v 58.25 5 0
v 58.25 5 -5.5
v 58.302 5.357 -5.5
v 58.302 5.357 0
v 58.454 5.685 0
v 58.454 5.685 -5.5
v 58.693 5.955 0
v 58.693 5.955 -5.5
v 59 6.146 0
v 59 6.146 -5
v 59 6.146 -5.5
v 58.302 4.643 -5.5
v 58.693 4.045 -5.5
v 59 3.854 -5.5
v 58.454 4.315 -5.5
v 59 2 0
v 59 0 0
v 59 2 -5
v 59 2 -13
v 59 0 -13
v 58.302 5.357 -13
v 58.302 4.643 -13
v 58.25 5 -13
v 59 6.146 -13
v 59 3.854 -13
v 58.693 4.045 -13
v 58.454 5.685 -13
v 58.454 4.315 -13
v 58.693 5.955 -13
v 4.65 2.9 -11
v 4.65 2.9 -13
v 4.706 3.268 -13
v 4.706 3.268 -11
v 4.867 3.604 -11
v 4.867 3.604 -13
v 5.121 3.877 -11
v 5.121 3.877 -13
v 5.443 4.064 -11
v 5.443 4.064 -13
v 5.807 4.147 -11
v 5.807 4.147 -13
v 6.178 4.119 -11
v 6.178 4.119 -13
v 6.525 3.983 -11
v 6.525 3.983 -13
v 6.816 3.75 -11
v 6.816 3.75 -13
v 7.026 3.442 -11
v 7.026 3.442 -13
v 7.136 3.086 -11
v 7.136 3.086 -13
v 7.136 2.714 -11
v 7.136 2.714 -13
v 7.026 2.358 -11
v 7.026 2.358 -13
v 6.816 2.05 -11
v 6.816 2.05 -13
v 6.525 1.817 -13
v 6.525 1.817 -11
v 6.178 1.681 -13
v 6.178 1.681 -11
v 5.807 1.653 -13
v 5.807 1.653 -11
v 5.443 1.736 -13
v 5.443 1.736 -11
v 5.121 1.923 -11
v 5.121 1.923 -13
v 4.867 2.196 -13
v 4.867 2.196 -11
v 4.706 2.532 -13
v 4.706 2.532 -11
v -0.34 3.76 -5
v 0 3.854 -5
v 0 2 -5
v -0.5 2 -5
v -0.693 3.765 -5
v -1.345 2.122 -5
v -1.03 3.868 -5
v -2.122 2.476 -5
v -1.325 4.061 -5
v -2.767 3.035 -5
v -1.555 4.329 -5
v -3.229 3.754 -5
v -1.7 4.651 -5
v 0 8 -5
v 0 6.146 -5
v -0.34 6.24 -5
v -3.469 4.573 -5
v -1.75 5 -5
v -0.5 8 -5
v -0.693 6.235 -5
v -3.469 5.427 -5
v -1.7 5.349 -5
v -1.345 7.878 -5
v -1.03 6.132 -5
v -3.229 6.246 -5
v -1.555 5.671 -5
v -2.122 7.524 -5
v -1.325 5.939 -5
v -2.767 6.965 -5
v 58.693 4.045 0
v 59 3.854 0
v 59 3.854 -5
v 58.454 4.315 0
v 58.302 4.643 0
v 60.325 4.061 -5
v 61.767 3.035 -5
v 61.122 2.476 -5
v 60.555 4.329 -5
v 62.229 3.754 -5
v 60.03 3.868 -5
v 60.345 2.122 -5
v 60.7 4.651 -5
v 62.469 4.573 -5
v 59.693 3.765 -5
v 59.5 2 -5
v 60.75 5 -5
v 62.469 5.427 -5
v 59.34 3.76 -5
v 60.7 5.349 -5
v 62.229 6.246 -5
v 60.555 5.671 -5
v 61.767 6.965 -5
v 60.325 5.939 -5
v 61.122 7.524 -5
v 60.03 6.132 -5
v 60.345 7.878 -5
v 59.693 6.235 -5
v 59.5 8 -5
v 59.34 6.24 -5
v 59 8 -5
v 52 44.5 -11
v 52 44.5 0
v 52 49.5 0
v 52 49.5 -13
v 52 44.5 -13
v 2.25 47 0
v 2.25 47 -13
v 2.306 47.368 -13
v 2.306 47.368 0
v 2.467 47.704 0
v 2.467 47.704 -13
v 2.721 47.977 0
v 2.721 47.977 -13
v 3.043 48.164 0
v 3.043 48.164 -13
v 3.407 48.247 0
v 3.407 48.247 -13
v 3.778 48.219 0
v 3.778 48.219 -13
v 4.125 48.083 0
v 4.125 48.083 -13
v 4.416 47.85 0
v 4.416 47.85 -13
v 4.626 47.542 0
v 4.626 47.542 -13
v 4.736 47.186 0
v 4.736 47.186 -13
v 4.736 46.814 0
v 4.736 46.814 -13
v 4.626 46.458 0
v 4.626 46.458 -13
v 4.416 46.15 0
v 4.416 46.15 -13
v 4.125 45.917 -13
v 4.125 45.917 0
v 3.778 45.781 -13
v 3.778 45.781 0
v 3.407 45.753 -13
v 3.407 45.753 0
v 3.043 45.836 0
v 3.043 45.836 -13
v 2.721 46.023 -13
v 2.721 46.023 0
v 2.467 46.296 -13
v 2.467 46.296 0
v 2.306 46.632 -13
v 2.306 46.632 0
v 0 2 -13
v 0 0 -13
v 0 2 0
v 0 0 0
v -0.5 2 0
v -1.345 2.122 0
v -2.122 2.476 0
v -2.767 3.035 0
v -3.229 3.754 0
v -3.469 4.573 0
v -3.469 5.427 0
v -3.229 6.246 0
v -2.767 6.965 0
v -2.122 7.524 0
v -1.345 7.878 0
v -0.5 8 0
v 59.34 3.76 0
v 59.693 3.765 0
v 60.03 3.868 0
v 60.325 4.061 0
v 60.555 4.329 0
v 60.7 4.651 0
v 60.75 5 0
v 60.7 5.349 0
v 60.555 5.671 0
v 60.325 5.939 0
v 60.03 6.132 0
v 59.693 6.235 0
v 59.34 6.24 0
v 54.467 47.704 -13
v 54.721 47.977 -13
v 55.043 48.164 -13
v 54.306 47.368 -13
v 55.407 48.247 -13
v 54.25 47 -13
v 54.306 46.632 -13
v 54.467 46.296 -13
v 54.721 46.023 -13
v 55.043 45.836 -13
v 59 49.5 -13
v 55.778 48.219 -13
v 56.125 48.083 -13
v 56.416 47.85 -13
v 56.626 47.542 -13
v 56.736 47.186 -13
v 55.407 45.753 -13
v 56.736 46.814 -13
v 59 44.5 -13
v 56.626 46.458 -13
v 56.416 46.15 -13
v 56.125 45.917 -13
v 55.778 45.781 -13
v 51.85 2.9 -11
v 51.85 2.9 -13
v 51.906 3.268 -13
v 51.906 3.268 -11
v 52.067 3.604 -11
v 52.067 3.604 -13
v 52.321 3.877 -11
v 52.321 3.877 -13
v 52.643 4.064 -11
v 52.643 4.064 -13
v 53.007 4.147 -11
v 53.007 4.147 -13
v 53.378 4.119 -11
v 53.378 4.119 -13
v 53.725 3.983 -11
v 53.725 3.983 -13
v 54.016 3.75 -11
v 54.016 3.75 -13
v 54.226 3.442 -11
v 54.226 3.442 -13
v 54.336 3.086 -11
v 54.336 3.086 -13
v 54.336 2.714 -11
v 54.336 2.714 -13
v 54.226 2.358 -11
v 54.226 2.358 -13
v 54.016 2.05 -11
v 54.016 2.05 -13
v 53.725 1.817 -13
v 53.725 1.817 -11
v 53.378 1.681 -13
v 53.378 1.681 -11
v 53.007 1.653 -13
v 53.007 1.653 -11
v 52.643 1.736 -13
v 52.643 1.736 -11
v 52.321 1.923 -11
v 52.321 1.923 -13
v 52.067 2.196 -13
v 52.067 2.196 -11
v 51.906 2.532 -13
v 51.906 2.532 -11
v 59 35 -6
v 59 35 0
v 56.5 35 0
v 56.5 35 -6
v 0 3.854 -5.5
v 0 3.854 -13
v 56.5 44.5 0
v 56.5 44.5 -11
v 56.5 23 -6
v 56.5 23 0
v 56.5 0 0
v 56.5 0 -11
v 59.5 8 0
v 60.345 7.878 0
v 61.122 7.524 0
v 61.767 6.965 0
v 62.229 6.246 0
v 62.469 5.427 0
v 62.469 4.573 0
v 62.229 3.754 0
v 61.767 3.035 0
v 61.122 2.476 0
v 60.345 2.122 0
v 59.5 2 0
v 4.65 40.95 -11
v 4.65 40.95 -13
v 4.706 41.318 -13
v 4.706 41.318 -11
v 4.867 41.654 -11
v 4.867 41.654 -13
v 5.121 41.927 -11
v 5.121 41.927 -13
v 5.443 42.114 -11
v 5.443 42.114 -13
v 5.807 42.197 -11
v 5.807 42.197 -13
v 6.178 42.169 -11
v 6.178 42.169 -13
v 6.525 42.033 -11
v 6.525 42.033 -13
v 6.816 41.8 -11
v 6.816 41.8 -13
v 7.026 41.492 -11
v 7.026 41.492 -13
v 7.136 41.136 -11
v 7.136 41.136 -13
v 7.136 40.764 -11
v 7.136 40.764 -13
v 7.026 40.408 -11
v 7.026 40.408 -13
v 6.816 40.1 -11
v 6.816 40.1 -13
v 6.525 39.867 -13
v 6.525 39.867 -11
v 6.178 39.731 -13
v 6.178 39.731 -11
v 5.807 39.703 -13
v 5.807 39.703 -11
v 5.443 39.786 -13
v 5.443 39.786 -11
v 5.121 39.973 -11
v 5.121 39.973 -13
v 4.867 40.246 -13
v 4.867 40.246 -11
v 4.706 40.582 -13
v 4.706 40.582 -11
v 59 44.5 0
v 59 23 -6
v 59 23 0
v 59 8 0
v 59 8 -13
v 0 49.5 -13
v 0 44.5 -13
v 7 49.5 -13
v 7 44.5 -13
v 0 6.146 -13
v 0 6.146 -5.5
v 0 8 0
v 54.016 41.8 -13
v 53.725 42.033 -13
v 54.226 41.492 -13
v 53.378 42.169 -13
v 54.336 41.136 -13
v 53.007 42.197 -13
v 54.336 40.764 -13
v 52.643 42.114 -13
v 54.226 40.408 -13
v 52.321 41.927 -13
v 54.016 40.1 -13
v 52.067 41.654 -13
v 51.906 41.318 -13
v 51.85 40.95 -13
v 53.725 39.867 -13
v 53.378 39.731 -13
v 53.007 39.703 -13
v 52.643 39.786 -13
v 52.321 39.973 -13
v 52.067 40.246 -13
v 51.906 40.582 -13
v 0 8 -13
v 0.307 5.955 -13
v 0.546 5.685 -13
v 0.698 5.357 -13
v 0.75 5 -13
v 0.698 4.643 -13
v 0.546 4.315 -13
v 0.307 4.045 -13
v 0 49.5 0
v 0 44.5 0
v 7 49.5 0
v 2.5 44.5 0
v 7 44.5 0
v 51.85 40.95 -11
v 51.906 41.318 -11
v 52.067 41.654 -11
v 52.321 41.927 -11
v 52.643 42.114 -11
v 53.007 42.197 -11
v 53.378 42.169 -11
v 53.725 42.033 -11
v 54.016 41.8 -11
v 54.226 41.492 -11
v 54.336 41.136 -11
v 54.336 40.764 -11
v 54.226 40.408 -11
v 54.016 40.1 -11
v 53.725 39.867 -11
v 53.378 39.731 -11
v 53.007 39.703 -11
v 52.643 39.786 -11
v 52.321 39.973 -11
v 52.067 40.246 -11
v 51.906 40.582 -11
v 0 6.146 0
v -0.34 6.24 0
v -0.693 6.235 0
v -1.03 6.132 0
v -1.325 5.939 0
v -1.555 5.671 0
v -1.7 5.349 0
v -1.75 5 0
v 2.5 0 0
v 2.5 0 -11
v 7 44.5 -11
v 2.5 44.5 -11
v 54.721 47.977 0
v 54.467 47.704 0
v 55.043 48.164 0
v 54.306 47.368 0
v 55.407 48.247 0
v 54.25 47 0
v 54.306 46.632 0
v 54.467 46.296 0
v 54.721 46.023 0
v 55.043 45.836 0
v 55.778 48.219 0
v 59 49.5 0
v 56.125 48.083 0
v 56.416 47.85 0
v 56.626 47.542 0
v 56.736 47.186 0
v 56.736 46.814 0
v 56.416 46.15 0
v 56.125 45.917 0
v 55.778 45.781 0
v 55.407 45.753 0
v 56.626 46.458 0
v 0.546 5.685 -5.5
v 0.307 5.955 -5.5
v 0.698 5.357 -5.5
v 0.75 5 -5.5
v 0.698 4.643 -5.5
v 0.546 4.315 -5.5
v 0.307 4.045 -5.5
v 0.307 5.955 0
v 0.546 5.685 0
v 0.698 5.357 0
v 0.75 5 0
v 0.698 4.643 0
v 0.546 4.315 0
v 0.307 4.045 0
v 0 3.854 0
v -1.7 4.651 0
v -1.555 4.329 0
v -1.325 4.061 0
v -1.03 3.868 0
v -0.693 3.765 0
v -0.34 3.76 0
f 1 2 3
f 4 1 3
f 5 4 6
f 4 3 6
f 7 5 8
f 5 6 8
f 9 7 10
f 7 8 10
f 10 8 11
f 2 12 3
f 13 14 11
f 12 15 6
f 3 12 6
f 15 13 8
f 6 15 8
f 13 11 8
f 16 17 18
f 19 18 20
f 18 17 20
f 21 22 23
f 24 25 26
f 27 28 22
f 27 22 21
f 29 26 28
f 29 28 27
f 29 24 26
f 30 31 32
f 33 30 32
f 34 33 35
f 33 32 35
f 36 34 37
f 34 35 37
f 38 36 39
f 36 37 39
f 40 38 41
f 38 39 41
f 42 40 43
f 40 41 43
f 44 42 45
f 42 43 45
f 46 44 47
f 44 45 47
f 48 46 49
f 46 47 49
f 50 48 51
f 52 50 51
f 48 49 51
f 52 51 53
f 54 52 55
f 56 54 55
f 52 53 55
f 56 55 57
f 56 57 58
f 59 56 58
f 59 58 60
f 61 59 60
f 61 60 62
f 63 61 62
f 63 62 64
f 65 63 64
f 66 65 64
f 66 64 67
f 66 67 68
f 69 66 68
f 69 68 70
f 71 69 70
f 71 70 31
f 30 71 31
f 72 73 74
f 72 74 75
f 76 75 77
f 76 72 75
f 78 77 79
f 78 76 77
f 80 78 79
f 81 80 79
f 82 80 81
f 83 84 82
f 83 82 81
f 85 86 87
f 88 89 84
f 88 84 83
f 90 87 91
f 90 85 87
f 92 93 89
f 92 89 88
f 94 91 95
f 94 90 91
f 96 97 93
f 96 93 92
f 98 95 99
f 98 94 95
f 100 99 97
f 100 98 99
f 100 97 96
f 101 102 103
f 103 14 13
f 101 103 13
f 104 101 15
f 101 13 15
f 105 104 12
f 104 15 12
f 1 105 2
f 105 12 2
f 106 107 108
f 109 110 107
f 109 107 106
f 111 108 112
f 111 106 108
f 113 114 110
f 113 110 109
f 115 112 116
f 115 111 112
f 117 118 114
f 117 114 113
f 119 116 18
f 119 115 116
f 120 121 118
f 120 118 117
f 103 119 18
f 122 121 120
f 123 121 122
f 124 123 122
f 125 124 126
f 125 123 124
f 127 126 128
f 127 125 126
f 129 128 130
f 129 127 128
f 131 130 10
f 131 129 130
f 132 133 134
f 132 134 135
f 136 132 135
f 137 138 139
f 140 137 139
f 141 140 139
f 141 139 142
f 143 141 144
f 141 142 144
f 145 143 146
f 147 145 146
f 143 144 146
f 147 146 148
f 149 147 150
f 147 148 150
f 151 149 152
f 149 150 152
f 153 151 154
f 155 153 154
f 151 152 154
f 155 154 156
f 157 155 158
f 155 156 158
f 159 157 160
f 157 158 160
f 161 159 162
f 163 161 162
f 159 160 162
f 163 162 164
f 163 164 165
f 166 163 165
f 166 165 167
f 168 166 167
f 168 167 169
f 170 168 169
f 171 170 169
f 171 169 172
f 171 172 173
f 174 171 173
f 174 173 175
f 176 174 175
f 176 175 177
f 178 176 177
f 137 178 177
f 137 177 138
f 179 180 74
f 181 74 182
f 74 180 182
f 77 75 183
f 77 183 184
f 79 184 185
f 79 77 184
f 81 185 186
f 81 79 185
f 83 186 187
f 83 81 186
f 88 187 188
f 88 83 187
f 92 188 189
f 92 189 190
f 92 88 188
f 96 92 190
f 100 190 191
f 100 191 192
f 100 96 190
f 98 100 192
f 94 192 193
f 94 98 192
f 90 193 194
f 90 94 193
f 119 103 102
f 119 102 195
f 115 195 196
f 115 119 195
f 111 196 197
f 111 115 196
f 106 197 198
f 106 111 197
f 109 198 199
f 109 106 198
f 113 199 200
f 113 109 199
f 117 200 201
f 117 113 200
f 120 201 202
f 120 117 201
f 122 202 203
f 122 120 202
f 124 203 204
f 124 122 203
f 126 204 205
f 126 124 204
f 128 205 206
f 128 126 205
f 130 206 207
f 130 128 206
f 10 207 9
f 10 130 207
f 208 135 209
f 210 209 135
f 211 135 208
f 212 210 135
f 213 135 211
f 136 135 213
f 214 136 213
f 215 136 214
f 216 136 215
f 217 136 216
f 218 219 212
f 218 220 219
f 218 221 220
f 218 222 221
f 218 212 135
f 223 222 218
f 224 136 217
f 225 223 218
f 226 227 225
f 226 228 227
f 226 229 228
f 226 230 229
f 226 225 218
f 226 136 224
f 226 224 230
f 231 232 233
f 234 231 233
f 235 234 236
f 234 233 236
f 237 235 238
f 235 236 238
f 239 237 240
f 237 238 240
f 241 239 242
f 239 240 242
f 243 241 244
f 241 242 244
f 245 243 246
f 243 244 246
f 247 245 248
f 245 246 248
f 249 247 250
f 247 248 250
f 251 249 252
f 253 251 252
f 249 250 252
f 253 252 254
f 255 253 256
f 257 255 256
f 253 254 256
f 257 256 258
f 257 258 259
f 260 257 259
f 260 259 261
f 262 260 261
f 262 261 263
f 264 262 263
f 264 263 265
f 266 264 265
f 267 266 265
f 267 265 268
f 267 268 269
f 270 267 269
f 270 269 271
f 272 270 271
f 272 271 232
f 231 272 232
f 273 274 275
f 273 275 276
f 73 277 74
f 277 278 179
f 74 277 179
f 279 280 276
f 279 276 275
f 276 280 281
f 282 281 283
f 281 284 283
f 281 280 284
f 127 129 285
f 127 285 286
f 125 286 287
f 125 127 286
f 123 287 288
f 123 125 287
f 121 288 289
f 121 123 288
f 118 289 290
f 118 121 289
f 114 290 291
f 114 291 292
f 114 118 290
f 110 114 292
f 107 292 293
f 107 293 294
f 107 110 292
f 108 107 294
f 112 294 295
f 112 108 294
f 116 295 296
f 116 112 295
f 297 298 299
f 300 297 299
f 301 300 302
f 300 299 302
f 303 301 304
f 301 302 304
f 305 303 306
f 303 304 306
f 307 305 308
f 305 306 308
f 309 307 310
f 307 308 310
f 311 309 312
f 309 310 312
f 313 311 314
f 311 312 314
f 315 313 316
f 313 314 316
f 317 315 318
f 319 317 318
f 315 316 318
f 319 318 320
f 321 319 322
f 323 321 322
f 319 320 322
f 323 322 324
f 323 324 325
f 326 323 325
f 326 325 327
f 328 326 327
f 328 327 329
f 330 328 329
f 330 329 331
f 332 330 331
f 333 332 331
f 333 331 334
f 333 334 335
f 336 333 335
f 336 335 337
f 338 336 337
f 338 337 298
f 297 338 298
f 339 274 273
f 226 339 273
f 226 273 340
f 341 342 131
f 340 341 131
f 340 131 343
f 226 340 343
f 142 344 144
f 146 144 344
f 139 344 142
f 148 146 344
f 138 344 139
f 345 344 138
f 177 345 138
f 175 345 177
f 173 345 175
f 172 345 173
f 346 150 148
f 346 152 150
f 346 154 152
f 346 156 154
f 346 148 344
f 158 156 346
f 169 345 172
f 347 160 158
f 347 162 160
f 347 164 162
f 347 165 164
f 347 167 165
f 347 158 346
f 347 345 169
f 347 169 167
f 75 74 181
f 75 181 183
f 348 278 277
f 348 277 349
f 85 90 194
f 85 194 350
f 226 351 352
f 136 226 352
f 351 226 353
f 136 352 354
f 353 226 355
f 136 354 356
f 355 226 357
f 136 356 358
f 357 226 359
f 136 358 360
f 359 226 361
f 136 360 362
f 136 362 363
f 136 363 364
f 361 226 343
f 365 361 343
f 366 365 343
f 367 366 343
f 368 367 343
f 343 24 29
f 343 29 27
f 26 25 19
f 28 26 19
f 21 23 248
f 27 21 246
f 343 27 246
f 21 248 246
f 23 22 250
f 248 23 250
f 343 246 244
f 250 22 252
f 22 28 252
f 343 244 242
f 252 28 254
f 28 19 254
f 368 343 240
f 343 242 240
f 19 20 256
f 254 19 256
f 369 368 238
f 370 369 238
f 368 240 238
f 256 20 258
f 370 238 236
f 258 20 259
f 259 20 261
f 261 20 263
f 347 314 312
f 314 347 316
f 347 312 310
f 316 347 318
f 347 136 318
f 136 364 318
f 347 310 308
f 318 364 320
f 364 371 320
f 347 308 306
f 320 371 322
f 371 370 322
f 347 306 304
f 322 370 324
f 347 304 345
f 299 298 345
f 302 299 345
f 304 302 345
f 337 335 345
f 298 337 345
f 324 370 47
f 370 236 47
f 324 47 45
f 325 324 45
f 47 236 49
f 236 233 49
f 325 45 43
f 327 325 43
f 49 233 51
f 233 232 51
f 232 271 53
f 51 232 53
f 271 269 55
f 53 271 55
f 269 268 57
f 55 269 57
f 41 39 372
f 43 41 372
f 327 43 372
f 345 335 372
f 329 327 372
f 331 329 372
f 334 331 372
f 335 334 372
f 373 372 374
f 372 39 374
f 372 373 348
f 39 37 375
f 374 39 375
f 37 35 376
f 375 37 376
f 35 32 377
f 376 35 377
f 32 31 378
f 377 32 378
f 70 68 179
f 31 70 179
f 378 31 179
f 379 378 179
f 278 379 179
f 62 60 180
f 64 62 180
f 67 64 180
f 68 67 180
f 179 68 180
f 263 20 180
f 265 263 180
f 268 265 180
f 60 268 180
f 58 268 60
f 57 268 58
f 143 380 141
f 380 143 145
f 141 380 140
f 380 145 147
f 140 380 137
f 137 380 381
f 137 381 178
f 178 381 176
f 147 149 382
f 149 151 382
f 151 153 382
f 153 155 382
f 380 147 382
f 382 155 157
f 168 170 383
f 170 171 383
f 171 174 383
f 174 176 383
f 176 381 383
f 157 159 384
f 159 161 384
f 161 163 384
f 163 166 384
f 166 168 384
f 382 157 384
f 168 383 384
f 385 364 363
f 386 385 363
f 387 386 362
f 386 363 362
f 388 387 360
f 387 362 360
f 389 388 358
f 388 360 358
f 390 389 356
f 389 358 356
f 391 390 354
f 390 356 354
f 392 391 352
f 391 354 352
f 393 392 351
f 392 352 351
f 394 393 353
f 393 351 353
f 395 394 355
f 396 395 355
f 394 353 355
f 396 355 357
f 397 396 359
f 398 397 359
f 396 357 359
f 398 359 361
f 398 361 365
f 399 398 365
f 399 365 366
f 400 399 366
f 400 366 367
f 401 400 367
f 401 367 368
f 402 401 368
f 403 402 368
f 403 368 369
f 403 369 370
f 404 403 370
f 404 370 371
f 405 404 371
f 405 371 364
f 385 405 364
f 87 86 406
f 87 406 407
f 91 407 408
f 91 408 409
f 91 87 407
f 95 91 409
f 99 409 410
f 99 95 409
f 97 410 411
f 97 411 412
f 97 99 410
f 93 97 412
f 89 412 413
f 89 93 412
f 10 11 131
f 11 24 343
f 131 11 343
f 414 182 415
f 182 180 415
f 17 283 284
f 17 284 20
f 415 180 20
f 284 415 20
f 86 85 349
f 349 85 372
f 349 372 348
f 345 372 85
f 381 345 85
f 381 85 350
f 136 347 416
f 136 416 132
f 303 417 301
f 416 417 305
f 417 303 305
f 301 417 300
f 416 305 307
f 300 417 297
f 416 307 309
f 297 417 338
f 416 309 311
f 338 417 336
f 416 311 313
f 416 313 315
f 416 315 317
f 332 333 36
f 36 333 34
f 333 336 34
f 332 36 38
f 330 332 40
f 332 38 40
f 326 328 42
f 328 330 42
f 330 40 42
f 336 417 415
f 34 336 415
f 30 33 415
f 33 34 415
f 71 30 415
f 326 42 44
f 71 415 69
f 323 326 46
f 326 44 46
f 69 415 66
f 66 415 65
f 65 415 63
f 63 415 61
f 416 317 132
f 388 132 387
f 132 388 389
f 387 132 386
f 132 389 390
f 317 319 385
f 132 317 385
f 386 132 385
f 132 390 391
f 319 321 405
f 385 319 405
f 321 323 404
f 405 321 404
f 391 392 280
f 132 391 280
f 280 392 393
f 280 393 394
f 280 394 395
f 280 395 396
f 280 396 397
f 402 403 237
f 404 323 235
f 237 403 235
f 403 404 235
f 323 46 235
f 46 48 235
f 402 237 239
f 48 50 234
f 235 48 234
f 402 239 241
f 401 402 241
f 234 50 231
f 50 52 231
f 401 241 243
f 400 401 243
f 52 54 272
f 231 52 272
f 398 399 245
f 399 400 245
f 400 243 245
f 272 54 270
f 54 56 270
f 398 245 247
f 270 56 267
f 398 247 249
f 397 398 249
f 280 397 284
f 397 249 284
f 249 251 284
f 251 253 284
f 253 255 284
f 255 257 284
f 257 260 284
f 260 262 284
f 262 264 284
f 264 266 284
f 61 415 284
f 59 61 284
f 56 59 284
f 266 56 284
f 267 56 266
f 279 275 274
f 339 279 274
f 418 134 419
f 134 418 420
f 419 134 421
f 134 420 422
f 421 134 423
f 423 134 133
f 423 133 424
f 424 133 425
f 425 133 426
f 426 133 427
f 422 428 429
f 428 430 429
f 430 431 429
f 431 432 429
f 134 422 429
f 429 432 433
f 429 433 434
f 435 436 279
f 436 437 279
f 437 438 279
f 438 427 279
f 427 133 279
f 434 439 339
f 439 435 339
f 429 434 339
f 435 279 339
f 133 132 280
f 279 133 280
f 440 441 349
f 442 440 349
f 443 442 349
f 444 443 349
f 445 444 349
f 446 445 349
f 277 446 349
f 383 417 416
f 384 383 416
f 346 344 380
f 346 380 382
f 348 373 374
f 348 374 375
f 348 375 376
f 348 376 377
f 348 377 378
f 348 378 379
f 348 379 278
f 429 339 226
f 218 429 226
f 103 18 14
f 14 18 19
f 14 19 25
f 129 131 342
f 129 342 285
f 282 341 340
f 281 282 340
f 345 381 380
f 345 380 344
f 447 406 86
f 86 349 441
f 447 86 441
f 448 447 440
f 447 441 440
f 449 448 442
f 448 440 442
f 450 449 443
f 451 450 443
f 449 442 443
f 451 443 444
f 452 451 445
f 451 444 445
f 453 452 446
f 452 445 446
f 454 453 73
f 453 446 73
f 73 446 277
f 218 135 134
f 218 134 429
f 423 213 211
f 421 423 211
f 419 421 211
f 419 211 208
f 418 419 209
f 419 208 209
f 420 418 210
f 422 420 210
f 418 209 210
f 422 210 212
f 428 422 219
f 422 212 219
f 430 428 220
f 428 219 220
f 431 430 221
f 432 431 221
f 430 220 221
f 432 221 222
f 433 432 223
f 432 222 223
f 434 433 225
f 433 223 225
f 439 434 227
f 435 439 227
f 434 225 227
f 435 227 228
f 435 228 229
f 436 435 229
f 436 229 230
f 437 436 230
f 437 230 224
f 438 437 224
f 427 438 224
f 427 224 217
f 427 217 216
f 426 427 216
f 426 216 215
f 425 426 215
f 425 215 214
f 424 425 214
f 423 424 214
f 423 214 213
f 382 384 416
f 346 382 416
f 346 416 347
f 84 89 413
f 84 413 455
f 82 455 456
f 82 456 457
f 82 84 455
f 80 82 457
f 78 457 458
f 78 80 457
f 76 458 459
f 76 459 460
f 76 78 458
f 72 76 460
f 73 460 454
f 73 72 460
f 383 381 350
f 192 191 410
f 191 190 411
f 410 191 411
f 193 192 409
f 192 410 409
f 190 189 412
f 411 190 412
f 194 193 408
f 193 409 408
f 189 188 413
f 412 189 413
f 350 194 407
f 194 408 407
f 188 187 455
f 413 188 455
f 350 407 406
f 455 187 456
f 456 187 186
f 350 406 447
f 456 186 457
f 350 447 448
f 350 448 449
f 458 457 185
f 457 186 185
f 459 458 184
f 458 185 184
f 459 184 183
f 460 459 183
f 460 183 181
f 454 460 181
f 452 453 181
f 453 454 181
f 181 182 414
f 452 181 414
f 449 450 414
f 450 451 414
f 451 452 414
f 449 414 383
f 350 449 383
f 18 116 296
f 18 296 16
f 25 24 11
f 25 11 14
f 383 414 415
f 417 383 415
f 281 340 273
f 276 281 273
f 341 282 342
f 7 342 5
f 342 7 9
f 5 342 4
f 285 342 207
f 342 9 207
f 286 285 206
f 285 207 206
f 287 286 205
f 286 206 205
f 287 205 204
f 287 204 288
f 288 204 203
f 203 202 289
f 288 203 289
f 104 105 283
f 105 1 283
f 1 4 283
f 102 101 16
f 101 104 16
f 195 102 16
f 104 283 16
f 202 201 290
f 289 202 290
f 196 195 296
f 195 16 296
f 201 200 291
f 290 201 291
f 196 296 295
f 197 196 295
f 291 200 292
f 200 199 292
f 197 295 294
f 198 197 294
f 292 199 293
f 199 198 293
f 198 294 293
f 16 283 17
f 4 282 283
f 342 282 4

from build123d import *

# Parameters (mm, degrees)
BOSS_EXTRUDE1_DEPTH = 44.5
SKETCH2_W           = 6
SKETCH2_H           = 12
CUT_EXTRUDE1_DEPTH  = 10
BOSS_EXTRUDE2_DEPTH = 13
CUT_EXTRUDE2_DEPTH  = 13
SKETCH4_W           = 7
SKETCH4_H           = 13
BOSS_EXTRUDE3_DEPTH = 5
SKETCH5_R           = 1.25
CUT_EXTRUDE3_DEPTH  = 81.78056697
SKETCH7_R           = 1.25
CUT_EXTRUDE4_DEPTH  = 10
CUT_EXTRUDE6_DEPTH  = 8
BOSS_EXTRUDE4_DEPTH = 7.5


with BuildPart() as part:
    # Sketch1 → Boss-Extrude1 (new body)
    with BuildSketch(Plane(origin=(0, 0, 0), x_dir=(1, 0, 0), z_dir=(0, 1, 0))):
        Polygon((0, 0), (2.5, 0), (2.5, 11), (56.5, 11), (56.5, 0), (59, 0), (59, 13), (0, 13), align=None)
    extrude(amount=BOSS_EXTRUDE1_DEPTH)

    # Sketch2 → Cut-Extrude1 (cut)
    with BuildSketch(Plane(origin=(59, 0, 0), x_dir=(0, 0, -1), z_dir=(1, 0, 0))):
        with Locations((3, 29)):
            Rectangle(SKETCH2_W, SKETCH2_H)
    extrude(amount=-CUT_EXTRUDE1_DEPTH, mode=Mode.SUBTRACT)

    # Sketch3 → Boss-Extrude2 (add)
    with BuildSketch(Plane(origin=(0, 0, -13), x_dir=(-1, 0, 0), z_dir=(0, 0, -1))):
        with BuildLine():
            Line((-59, 6.145643924), (-59, 8))
            Line((-59, 8), (-59.5, 8))
            ThreePointArc((-59.5, 8), (-62.5, 5), (-59.5, 2))
            Line((-59.5, 2), (-59, 2))
            Line((-59, 2), (-59, 3.854356076))
            ThreePointArc((-59, 3.854356076), (-60.75, 5), (-59, 6.145643924))
        make_face()
        with BuildLine():
            Line((0.5, 8), (0, 8))
            Line((0, 8), (0, 6.145643924))
            ThreePointArc((0, 6.145643924), (1.75, 5), (0, 3.854356076))
            Line((0, 3.854356076), (0, 2))
            Line((0, 2), (0.5, 2))
            ThreePointArc((0.5, 2), (3.5, 5), (0.5, 8))
        make_face()
    extrude(amount=-BOSS_EXTRUDE2_DEPTH)

    # Sketch3<3> → Cut-Extrude2 (cut)
    with BuildSketch(Plane(origin=(0, 0, -13), x_dir=(-1, 0, 0), z_dir=(0, 0, -1))):
        with BuildLine():
            ThreePointArc((-59, 3.854356076), (-58.25, 5), (-59, 6.145643924))
            Line((-59, 6.145643924), (-59, 3.854356076))
        make_face()
        with BuildLine():
            Line((0, 3.854356076), (0, 6.145643924))
            ThreePointArc((0, 6.145643924), (-0.75, 5), (0, 3.854356076))
        make_face()
    extrude(amount=-CUT_EXTRUDE2_DEPTH, mode=Mode.SUBTRACT)

    # Sketch4 → Boss-Extrude3 (add)
    with BuildSketch(Plane(origin=(0, 44.5, 0), x_dir=(1, 0, 0), z_dir=(0, 1, 0))):
        with Locations((3.5, 6.5)):
            Rectangle(SKETCH4_W, SKETCH4_H)
        with Locations((55.5, 6.5)):
            Rectangle(SKETCH4_W, SKETCH4_H)
    extrude(amount=BOSS_EXTRUDE3_DEPTH)

    # Sketch5 → Cut-Extrude3 (cut, through all)
    with BuildSketch(Plane(origin=(0, 0, -13), x_dir=(-1, 0, 0), z_dir=(0, 0, -1))):
        with Locations((-55.5, 47)):
            Circle(SKETCH5_R)
        with Locations((-3.5, 47)):
            Circle(SKETCH5_R)
        with Locations((-6, 73.35)):
            Circle(SKETCH5_R)
        with Locations((-53, 73.35)):
            Circle(SKETCH5_R)
    extrude(amount=-CUT_EXTRUDE3_DEPTH, mode=Mode.SUBTRACT)

    # Sketch7 → Cut-Extrude4 (cut)
    with BuildSketch(Plane(origin=(0, 0, -13), x_dir=(-1, 0, 0), z_dir=(0, 0, -1))):
        with Locations((-5.9, 2.9)):
            Circle(SKETCH7_R)
        with Locations((-53.1, 2.9)):
            Circle(SKETCH7_R)
        with Locations((-53.1, 40.95)):
            Circle(SKETCH7_R)
        with Locations((-5.9, 40.95)):
            Circle(SKETCH7_R)
    extrude(amount=-CUT_EXTRUDE4_DEPTH, mode=Mode.SUBTRACT)

    # Sketch3<4> → Cut-Extrude6 (cut)
    with BuildSketch(Plane(origin=(0, 0, -13), x_dir=(-1, 0, 0), z_dir=(0, 0, -1))):
        with BuildLine():
            Line((-59, 6.145643924), (-59, 8))
            Line((-59, 8), (-59.5, 8))
            ThreePointArc((-59.5, 8), (-62.5, 5), (-59.5, 2))
            Line((-59.5, 2), (-59, 2))
            Line((-59, 2), (-59, 3.854356076))
            ThreePointArc((-59, 3.854356076), (-60.75, 5), (-59, 6.145643924))
        make_face()
        with BuildLine():
            Line((0.5, 8), (0, 8))
            Line((0, 8), (0, 6.145643924))
            ThreePointArc((0, 6.145643924), (1.75, 5), (0, 3.854356076))
            Line((0, 3.854356076), (0, 2))
            Line((0, 2), (0.5, 2))
            ThreePointArc((0.5, 2), (3.5, 5), (0.5, 8))
        make_face()
    extrude(amount=-CUT_EXTRUDE6_DEPTH, mode=Mode.SUBTRACT)

    # Sketch3<5> → Boss-Extrude4 (add)
    with BuildSketch(Plane(origin=(0, 0, -13), x_dir=(-1, 0, 0), z_dir=(0, 0, -1))):
        with BuildLine():
            ThreePointArc((-59, 3.854356076), (-58.25, 5), (-59, 6.145643924))
            Line((-59, 6.145643924), (-59, 3.854356076))
        make_face()
        with BuildLine():
            Line((0, 3.854356076), (0, 6.145643924))
            ThreePointArc((0, 6.145643924), (-0.75, 5), (0, 3.854356076))
        make_face()
    extrude(amount=-BOSS_EXTRUDE4_DEPTH)


solid = part.part
